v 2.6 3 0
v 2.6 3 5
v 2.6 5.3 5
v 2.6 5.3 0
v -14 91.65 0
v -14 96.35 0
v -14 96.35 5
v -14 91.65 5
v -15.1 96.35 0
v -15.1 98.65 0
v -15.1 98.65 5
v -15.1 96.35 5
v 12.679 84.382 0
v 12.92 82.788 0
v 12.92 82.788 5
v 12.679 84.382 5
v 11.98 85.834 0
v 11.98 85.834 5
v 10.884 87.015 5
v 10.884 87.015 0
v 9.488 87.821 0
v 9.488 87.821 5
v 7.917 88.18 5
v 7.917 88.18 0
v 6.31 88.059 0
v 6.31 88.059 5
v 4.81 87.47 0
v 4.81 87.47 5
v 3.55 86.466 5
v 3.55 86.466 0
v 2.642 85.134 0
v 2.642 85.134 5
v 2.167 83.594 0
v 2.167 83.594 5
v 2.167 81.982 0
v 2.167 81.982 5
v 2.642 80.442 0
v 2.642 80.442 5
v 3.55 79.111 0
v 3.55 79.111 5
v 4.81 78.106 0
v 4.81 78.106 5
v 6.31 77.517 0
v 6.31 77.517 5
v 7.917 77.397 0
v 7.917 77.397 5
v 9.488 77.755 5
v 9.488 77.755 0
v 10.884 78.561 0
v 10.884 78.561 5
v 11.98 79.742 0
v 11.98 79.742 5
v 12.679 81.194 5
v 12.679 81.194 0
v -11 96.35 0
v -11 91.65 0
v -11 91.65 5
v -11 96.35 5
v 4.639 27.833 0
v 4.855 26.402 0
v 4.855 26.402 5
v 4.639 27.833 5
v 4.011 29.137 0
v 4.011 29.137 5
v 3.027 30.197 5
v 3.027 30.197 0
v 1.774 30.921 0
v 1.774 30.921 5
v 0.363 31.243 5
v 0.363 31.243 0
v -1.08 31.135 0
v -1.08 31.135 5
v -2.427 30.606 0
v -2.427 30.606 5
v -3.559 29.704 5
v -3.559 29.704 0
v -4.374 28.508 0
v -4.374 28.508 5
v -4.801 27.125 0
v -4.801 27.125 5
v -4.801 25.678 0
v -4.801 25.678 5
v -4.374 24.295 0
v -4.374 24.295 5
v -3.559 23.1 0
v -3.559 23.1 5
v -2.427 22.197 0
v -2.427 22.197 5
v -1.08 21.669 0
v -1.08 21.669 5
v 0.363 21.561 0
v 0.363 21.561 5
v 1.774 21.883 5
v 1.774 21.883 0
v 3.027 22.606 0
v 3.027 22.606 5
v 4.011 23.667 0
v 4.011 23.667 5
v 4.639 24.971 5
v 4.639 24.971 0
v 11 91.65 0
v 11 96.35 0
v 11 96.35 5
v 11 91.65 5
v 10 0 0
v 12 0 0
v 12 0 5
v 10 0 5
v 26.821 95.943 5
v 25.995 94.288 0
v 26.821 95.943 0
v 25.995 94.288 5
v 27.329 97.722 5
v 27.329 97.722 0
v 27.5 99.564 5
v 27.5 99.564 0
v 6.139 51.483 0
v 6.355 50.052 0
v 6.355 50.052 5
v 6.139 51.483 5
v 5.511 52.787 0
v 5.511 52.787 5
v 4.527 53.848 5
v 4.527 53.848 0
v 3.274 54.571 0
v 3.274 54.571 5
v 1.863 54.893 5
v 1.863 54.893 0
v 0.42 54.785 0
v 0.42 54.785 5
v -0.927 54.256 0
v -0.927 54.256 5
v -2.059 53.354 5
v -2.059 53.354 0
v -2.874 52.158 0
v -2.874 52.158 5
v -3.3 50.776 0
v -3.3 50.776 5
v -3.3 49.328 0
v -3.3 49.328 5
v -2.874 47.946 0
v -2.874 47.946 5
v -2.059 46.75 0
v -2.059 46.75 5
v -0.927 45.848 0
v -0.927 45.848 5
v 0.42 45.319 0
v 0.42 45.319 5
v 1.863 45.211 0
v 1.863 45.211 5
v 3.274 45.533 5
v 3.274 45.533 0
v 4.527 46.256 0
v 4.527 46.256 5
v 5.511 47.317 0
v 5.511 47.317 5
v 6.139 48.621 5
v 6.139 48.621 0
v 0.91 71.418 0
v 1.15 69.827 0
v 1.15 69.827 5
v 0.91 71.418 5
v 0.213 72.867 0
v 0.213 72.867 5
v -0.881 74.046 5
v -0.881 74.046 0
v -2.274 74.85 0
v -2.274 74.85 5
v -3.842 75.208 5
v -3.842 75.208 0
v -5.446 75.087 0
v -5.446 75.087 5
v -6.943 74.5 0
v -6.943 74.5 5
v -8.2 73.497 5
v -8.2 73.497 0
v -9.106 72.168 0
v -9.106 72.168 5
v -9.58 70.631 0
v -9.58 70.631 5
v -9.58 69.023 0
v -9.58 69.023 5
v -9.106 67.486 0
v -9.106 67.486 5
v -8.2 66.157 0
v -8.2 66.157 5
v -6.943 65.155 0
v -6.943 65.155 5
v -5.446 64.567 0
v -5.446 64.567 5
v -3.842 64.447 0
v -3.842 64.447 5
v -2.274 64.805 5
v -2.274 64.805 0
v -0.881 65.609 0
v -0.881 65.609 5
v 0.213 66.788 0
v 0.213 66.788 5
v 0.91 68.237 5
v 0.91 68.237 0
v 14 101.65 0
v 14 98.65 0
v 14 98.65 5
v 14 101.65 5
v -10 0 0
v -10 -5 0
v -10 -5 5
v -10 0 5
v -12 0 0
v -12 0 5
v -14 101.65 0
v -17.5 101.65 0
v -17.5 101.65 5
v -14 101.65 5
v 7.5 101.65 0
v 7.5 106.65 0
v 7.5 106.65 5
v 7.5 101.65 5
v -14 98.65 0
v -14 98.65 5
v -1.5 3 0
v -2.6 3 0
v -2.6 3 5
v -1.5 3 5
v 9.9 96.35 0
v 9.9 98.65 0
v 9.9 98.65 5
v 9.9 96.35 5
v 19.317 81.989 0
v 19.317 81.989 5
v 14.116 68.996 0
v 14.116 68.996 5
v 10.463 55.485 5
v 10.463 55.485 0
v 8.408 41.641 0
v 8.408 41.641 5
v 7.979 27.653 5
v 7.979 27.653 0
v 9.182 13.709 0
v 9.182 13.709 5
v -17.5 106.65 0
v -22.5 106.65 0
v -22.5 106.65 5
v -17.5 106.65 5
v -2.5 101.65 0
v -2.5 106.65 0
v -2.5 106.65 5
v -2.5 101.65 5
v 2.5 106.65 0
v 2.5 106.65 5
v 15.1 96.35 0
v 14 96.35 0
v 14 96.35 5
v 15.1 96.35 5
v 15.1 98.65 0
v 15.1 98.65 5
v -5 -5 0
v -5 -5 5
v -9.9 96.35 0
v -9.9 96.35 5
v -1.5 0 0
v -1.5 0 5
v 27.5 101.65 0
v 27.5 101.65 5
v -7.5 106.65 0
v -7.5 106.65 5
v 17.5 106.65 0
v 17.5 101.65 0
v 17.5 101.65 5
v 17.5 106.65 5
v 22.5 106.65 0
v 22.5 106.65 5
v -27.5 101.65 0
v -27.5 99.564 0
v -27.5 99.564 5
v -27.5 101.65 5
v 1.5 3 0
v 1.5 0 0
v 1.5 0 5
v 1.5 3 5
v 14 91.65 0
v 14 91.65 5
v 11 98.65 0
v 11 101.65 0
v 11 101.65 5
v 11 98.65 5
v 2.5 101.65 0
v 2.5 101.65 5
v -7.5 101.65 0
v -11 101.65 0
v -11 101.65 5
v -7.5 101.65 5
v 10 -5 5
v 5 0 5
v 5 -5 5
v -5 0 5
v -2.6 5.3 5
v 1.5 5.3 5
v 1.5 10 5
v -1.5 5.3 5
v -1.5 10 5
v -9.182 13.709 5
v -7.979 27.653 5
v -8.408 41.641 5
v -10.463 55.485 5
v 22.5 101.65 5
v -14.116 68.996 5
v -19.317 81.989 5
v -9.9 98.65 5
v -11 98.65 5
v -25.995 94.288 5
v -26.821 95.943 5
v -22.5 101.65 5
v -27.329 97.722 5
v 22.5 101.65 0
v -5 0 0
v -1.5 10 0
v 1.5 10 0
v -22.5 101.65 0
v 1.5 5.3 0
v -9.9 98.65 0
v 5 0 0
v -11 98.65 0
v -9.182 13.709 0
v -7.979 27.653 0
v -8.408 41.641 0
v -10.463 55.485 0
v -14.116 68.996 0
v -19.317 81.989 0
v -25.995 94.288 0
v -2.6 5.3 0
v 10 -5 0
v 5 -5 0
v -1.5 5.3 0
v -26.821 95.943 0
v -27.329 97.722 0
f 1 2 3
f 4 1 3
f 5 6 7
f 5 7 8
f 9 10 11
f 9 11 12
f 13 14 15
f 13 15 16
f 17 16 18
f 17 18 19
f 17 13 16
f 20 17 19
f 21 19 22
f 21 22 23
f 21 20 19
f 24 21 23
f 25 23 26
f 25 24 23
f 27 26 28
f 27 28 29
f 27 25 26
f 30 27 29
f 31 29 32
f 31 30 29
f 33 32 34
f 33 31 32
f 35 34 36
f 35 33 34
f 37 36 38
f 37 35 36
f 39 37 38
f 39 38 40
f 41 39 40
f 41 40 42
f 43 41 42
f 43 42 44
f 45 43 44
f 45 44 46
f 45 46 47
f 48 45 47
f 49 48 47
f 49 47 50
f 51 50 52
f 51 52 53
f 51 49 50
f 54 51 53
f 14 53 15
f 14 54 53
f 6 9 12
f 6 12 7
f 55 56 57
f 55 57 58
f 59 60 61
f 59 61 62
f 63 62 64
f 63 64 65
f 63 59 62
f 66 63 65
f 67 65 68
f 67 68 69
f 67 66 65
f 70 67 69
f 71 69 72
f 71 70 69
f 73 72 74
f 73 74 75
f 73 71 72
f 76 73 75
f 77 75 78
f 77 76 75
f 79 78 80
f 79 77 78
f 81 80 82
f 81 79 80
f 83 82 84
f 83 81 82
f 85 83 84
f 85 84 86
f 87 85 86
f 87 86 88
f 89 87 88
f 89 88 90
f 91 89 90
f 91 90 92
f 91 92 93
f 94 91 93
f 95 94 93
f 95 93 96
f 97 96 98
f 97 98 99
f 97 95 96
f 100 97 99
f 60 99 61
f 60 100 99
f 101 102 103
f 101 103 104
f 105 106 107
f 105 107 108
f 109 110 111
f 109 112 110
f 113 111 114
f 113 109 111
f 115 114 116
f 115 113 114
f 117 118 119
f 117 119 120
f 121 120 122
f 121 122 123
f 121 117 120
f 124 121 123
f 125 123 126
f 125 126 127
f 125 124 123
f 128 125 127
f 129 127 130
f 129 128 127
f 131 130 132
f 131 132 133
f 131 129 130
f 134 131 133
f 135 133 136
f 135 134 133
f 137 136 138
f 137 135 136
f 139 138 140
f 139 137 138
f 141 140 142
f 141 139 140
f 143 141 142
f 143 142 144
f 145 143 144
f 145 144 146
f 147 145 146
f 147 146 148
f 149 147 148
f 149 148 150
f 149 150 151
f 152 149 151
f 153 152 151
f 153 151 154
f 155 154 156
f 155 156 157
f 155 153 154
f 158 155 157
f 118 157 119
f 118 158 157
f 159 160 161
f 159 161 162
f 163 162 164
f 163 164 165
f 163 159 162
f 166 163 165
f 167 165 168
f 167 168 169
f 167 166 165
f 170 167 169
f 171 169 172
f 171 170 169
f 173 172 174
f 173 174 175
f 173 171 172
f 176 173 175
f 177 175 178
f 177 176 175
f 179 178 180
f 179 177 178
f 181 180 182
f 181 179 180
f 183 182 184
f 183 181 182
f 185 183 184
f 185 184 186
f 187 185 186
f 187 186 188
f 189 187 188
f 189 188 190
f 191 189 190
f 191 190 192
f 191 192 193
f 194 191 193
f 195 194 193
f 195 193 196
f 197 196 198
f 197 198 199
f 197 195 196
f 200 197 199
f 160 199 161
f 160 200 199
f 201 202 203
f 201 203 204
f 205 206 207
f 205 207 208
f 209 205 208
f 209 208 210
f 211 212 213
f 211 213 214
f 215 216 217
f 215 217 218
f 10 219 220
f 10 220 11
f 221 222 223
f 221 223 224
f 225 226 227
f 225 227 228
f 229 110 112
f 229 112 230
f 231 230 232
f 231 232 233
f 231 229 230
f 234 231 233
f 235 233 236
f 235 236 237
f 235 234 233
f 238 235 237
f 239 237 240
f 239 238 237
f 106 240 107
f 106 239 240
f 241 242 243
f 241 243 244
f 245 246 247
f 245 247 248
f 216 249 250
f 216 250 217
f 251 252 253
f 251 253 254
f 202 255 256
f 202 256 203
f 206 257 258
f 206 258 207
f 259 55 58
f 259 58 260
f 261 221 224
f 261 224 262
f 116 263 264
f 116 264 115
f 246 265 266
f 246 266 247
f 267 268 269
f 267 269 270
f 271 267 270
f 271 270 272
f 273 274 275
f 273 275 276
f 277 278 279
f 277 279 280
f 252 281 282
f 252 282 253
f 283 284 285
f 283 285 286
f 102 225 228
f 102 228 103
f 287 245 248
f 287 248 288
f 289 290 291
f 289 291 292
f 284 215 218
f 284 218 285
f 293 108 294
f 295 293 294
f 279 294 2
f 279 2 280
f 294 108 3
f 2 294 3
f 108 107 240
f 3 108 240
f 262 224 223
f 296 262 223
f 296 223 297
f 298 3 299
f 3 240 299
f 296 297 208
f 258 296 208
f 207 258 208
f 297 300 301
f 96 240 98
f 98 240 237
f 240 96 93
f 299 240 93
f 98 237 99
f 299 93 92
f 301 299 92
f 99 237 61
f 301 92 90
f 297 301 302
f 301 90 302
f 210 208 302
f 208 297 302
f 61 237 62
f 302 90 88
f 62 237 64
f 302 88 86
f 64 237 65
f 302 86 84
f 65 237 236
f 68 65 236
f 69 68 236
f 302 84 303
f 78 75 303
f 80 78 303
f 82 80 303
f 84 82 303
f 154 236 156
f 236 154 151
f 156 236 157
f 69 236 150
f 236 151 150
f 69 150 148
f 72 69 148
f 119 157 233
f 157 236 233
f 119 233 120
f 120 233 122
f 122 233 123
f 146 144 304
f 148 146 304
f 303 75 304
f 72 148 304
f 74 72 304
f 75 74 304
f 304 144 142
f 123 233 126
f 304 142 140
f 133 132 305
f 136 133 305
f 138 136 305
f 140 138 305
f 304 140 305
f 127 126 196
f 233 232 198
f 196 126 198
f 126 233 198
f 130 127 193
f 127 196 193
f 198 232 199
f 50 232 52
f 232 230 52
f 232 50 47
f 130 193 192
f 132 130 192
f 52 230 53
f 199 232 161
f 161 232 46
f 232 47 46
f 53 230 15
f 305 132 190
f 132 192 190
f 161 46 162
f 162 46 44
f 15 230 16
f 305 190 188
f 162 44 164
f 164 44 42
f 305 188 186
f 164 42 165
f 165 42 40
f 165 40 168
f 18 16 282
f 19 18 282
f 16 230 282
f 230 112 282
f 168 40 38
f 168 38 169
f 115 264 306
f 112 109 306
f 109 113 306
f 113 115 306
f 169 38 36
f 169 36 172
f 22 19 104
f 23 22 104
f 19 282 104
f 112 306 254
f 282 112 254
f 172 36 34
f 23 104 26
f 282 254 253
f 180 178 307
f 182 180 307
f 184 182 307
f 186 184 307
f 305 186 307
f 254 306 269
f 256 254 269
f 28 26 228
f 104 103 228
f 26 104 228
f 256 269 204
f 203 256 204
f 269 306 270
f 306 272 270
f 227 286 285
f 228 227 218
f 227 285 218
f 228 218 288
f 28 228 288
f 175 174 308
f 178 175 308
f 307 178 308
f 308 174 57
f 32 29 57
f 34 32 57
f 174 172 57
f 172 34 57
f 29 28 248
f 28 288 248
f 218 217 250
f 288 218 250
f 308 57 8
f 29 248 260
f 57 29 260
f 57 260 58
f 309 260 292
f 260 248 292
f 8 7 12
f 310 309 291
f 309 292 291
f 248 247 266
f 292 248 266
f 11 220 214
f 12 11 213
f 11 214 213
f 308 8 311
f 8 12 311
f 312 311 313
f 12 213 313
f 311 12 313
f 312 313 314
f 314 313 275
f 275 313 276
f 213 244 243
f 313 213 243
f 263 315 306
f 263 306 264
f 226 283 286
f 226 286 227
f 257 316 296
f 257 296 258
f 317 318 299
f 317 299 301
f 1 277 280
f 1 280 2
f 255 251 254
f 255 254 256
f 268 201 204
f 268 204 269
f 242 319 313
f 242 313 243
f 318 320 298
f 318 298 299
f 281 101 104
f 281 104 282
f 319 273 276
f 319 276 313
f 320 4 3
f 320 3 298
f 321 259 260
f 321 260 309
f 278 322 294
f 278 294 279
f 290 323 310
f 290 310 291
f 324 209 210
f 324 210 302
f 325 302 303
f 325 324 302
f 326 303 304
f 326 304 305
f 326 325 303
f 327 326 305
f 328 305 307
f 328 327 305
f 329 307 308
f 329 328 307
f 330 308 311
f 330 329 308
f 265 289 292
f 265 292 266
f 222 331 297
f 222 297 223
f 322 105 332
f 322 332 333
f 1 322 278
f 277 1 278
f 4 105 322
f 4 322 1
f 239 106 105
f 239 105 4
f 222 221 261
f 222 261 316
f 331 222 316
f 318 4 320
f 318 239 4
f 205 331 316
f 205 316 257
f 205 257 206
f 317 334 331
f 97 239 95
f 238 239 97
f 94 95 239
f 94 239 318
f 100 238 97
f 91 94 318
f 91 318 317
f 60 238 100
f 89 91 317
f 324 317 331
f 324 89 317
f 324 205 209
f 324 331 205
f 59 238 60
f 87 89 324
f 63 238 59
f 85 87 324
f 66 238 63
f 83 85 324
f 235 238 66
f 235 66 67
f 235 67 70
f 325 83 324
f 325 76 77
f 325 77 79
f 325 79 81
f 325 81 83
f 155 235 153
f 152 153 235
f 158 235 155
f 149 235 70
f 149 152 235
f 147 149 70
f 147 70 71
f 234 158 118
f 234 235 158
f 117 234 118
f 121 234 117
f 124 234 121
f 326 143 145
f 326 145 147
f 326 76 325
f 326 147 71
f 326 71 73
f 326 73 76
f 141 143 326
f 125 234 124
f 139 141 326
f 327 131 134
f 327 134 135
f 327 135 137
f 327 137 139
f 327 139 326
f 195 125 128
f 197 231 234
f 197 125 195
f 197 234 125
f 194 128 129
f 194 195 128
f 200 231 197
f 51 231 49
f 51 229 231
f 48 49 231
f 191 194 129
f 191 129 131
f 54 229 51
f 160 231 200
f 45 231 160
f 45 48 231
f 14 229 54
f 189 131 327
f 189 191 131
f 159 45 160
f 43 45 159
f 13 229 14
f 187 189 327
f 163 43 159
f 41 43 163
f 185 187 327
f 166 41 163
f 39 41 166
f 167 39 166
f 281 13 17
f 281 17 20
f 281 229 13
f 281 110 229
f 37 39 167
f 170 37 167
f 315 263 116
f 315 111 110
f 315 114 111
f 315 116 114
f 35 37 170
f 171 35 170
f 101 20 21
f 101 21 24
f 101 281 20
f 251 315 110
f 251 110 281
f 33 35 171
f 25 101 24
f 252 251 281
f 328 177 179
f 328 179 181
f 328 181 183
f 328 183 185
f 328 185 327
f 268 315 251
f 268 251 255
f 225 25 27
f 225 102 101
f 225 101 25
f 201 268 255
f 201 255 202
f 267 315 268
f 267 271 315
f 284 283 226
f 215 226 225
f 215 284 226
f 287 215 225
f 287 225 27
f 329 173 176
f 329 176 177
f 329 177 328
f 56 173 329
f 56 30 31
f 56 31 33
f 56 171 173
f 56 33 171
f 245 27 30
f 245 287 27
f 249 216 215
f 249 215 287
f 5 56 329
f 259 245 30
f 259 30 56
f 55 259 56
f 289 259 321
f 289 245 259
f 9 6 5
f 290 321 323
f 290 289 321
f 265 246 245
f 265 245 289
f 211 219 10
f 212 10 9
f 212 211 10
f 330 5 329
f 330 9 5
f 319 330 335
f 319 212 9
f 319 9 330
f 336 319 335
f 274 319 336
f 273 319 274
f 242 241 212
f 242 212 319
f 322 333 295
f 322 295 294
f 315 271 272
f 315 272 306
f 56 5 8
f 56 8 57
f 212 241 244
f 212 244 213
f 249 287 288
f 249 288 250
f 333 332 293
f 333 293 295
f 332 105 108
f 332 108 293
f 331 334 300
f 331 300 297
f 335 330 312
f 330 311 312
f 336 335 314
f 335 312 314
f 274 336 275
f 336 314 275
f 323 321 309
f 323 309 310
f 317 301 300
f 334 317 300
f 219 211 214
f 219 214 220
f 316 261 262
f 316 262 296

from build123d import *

# Parameters (mm, degrees)
ESQUISSE1_R        = 5.406629484
ESQUISSE1_R_2      = 5.395392345
ESQUISSE1_R_3      = 4.854658012
ESQUISSE1_R_4      = 4.85477379
BOSS_EXTRU_1_DEPTH = 5
CONG_1_R           = 10


with BuildPart() as part:
    # Esquisse1 → Boss.-Extru.1 (new body)
    with BuildSketch(Plane.XY):
        with BuildLine():
            Line((-10, 0), (-12, 0))
            ThreePointArc((-12, 0), (-9.447374533, 49.977092468), (-27.5, 96.649658093))
            Line((-27.5, 96.649658093), (-27.5, 101.649658093))
            Line((-27.5, 101.649658093), (-22.5, 101.649658093))
            Line((-22.5, 101.649658093), (-22.5, 106.649658093))
            Line((-22.5, 106.649658093), (-17.5, 106.649658093))
            Line((-17.5, 106.649658093), (-17.5, 101.649658093))
            Line((-17.5, 101.649658093), (-14, 101.649658093))
            Line((-14, 101.649658093), (-14, 98.649658093))
            Line((-14, 98.649658093), (-15.1, 98.649658093))
            Line((-15.1, 98.649658093), (-15.1, 96.349658093))
            Line((-15.1, 96.349658093), (-14, 96.349658093))
            Line((-14, 96.349658093), (-14, 91.649658093))
            Line((-14, 91.649658093), (-11, 91.649658093))
            Line((-11, 91.649658093), (-11, 96.349658093))
            Line((-11, 96.349658093), (-9.9, 96.349658093))
            Line((-9.9, 96.349658093), (-9.9, 98.649658093))
            Line((-9.9, 98.649658093), (-11, 98.649658093))
            Line((-11, 98.649658093), (-11, 101.649658093))
            Line((-11, 101.649658093), (-7.5, 101.649658093))
            Line((-7.5, 101.649658093), (-7.5, 106.649658093))
            Line((-7.5, 106.649658093), (-2.5, 106.649658093))
            Line((-2.5, 106.649658093), (-2.5, 101.649658093))
            Line((-2.5, 101.649658093), (2.5, 101.649658093))
            Line((2.5, 101.649658093), (2.5, 106.649658093))
            Line((2.5, 106.649658093), (7.5, 106.649658093))
            Line((7.5, 106.649658093), (7.5, 101.649658093))
            Line((7.5, 101.649658093), (11, 101.649658093))
            Line((11, 101.649658093), (11, 98.649658093))
            Line((11, 98.649658093), (9.9, 98.649658093))
            Line((9.9, 98.649658093), (9.9, 96.349658093))
            Line((9.9, 96.349658093), (11, 96.349658093))
            Line((11, 96.349658093), (11, 91.649658093))
            Line((11, 91.649658093), (14, 91.649658093))
            Line((14, 91.649658093), (14, 96.349658093))
            Line((14, 96.349658093), (15.1, 96.349658093))
            Line((15.1, 96.349658093), (15.1, 98.649658093))
            Line((15.1, 98.649658093), (14, 98.649658093))
            Line((14, 98.649658093), (14, 101.649658093))
            Line((14, 101.649658093), (17.5, 101.649658093))
            Line((17.5, 101.649658093), (17.5, 106.649658093))
            Line((17.5, 106.649658093), (22.5, 106.649658093))
            Line((22.5, 106.649658093), (22.5, 101.649658093))
            Line((22.5, 101.649658093), (27.5, 101.649658093))
            Line((27.5, 101.649658093), (27.5, 96.649658093))
            ThreePointArc((27.5, 96.649658093), (9.447374533, 49.977092468), (12, 0))
            Line((12, 0), (10, 0))
            Line((10, 0), (10, -5))
            Line((10, -5), (5, -5))
            Line((5, -5), (5, 0))
            Line((5, 0), (1.5, 0))
            Line((1.5, 0), (1.5, 3))
            Line((1.5, 3), (2.6, 3))
            Line((2.6, 3), (2.6, 5.3))
            Line((2.6, 5.3), (1.5, 5.3))
            Line((1.5, 5.3), (1.5, 10))
            Line((1.5, 10), (-1.5, 10))
            Line((-1.5, 10), (-1.5, 5.3))
            Line((-1.5, 5.3), (-2.6, 5.3))
            Line((-2.6, 5.3), (-2.6, 3))
            Line((-2.6, 3), (-1.5, 3))
            Line((-1.5, 3), (-1.5, 0))
            Line((-1.5, 0), (-5, 0))
            Line((-5, 0), (-5, -5))
            Line((-5, -5), (-10, -5))
            Line((-10, -5), (-10, 0))
        make_face()
        with Locations((7.512942396, 82.788090233)):
            Circle(ESQUISSE1_R, mode=Mode.SUBTRACT)
        with Locations((-4.245332426, 69.827264576)):
            Circle(ESQUISSE1_R_2, mode=Mode.SUBTRACT)
        with Locations((1.500188226, 50.051984193)):
            Circle(ESQUISSE1_R_3, mode=Mode.SUBTRACT)
        with Locations((0, 26.401817788)):
            Circle(ESQUISSE1_R_4, mode=Mode.SUBTRACT)
    extrude(amount=BOSS_EXTRU_1_DEPTH)

    # Congé1
    cong_1_edges = [part.edges().sort_by_distance(p)[0] for p in [
        (27.5, 96.649658093, 2.5),
        (-27.5, 96.649658093, 2.5),
    ]]
    fillet(cong_1_edges, radius=CONG_1_R)


solid = part.part
